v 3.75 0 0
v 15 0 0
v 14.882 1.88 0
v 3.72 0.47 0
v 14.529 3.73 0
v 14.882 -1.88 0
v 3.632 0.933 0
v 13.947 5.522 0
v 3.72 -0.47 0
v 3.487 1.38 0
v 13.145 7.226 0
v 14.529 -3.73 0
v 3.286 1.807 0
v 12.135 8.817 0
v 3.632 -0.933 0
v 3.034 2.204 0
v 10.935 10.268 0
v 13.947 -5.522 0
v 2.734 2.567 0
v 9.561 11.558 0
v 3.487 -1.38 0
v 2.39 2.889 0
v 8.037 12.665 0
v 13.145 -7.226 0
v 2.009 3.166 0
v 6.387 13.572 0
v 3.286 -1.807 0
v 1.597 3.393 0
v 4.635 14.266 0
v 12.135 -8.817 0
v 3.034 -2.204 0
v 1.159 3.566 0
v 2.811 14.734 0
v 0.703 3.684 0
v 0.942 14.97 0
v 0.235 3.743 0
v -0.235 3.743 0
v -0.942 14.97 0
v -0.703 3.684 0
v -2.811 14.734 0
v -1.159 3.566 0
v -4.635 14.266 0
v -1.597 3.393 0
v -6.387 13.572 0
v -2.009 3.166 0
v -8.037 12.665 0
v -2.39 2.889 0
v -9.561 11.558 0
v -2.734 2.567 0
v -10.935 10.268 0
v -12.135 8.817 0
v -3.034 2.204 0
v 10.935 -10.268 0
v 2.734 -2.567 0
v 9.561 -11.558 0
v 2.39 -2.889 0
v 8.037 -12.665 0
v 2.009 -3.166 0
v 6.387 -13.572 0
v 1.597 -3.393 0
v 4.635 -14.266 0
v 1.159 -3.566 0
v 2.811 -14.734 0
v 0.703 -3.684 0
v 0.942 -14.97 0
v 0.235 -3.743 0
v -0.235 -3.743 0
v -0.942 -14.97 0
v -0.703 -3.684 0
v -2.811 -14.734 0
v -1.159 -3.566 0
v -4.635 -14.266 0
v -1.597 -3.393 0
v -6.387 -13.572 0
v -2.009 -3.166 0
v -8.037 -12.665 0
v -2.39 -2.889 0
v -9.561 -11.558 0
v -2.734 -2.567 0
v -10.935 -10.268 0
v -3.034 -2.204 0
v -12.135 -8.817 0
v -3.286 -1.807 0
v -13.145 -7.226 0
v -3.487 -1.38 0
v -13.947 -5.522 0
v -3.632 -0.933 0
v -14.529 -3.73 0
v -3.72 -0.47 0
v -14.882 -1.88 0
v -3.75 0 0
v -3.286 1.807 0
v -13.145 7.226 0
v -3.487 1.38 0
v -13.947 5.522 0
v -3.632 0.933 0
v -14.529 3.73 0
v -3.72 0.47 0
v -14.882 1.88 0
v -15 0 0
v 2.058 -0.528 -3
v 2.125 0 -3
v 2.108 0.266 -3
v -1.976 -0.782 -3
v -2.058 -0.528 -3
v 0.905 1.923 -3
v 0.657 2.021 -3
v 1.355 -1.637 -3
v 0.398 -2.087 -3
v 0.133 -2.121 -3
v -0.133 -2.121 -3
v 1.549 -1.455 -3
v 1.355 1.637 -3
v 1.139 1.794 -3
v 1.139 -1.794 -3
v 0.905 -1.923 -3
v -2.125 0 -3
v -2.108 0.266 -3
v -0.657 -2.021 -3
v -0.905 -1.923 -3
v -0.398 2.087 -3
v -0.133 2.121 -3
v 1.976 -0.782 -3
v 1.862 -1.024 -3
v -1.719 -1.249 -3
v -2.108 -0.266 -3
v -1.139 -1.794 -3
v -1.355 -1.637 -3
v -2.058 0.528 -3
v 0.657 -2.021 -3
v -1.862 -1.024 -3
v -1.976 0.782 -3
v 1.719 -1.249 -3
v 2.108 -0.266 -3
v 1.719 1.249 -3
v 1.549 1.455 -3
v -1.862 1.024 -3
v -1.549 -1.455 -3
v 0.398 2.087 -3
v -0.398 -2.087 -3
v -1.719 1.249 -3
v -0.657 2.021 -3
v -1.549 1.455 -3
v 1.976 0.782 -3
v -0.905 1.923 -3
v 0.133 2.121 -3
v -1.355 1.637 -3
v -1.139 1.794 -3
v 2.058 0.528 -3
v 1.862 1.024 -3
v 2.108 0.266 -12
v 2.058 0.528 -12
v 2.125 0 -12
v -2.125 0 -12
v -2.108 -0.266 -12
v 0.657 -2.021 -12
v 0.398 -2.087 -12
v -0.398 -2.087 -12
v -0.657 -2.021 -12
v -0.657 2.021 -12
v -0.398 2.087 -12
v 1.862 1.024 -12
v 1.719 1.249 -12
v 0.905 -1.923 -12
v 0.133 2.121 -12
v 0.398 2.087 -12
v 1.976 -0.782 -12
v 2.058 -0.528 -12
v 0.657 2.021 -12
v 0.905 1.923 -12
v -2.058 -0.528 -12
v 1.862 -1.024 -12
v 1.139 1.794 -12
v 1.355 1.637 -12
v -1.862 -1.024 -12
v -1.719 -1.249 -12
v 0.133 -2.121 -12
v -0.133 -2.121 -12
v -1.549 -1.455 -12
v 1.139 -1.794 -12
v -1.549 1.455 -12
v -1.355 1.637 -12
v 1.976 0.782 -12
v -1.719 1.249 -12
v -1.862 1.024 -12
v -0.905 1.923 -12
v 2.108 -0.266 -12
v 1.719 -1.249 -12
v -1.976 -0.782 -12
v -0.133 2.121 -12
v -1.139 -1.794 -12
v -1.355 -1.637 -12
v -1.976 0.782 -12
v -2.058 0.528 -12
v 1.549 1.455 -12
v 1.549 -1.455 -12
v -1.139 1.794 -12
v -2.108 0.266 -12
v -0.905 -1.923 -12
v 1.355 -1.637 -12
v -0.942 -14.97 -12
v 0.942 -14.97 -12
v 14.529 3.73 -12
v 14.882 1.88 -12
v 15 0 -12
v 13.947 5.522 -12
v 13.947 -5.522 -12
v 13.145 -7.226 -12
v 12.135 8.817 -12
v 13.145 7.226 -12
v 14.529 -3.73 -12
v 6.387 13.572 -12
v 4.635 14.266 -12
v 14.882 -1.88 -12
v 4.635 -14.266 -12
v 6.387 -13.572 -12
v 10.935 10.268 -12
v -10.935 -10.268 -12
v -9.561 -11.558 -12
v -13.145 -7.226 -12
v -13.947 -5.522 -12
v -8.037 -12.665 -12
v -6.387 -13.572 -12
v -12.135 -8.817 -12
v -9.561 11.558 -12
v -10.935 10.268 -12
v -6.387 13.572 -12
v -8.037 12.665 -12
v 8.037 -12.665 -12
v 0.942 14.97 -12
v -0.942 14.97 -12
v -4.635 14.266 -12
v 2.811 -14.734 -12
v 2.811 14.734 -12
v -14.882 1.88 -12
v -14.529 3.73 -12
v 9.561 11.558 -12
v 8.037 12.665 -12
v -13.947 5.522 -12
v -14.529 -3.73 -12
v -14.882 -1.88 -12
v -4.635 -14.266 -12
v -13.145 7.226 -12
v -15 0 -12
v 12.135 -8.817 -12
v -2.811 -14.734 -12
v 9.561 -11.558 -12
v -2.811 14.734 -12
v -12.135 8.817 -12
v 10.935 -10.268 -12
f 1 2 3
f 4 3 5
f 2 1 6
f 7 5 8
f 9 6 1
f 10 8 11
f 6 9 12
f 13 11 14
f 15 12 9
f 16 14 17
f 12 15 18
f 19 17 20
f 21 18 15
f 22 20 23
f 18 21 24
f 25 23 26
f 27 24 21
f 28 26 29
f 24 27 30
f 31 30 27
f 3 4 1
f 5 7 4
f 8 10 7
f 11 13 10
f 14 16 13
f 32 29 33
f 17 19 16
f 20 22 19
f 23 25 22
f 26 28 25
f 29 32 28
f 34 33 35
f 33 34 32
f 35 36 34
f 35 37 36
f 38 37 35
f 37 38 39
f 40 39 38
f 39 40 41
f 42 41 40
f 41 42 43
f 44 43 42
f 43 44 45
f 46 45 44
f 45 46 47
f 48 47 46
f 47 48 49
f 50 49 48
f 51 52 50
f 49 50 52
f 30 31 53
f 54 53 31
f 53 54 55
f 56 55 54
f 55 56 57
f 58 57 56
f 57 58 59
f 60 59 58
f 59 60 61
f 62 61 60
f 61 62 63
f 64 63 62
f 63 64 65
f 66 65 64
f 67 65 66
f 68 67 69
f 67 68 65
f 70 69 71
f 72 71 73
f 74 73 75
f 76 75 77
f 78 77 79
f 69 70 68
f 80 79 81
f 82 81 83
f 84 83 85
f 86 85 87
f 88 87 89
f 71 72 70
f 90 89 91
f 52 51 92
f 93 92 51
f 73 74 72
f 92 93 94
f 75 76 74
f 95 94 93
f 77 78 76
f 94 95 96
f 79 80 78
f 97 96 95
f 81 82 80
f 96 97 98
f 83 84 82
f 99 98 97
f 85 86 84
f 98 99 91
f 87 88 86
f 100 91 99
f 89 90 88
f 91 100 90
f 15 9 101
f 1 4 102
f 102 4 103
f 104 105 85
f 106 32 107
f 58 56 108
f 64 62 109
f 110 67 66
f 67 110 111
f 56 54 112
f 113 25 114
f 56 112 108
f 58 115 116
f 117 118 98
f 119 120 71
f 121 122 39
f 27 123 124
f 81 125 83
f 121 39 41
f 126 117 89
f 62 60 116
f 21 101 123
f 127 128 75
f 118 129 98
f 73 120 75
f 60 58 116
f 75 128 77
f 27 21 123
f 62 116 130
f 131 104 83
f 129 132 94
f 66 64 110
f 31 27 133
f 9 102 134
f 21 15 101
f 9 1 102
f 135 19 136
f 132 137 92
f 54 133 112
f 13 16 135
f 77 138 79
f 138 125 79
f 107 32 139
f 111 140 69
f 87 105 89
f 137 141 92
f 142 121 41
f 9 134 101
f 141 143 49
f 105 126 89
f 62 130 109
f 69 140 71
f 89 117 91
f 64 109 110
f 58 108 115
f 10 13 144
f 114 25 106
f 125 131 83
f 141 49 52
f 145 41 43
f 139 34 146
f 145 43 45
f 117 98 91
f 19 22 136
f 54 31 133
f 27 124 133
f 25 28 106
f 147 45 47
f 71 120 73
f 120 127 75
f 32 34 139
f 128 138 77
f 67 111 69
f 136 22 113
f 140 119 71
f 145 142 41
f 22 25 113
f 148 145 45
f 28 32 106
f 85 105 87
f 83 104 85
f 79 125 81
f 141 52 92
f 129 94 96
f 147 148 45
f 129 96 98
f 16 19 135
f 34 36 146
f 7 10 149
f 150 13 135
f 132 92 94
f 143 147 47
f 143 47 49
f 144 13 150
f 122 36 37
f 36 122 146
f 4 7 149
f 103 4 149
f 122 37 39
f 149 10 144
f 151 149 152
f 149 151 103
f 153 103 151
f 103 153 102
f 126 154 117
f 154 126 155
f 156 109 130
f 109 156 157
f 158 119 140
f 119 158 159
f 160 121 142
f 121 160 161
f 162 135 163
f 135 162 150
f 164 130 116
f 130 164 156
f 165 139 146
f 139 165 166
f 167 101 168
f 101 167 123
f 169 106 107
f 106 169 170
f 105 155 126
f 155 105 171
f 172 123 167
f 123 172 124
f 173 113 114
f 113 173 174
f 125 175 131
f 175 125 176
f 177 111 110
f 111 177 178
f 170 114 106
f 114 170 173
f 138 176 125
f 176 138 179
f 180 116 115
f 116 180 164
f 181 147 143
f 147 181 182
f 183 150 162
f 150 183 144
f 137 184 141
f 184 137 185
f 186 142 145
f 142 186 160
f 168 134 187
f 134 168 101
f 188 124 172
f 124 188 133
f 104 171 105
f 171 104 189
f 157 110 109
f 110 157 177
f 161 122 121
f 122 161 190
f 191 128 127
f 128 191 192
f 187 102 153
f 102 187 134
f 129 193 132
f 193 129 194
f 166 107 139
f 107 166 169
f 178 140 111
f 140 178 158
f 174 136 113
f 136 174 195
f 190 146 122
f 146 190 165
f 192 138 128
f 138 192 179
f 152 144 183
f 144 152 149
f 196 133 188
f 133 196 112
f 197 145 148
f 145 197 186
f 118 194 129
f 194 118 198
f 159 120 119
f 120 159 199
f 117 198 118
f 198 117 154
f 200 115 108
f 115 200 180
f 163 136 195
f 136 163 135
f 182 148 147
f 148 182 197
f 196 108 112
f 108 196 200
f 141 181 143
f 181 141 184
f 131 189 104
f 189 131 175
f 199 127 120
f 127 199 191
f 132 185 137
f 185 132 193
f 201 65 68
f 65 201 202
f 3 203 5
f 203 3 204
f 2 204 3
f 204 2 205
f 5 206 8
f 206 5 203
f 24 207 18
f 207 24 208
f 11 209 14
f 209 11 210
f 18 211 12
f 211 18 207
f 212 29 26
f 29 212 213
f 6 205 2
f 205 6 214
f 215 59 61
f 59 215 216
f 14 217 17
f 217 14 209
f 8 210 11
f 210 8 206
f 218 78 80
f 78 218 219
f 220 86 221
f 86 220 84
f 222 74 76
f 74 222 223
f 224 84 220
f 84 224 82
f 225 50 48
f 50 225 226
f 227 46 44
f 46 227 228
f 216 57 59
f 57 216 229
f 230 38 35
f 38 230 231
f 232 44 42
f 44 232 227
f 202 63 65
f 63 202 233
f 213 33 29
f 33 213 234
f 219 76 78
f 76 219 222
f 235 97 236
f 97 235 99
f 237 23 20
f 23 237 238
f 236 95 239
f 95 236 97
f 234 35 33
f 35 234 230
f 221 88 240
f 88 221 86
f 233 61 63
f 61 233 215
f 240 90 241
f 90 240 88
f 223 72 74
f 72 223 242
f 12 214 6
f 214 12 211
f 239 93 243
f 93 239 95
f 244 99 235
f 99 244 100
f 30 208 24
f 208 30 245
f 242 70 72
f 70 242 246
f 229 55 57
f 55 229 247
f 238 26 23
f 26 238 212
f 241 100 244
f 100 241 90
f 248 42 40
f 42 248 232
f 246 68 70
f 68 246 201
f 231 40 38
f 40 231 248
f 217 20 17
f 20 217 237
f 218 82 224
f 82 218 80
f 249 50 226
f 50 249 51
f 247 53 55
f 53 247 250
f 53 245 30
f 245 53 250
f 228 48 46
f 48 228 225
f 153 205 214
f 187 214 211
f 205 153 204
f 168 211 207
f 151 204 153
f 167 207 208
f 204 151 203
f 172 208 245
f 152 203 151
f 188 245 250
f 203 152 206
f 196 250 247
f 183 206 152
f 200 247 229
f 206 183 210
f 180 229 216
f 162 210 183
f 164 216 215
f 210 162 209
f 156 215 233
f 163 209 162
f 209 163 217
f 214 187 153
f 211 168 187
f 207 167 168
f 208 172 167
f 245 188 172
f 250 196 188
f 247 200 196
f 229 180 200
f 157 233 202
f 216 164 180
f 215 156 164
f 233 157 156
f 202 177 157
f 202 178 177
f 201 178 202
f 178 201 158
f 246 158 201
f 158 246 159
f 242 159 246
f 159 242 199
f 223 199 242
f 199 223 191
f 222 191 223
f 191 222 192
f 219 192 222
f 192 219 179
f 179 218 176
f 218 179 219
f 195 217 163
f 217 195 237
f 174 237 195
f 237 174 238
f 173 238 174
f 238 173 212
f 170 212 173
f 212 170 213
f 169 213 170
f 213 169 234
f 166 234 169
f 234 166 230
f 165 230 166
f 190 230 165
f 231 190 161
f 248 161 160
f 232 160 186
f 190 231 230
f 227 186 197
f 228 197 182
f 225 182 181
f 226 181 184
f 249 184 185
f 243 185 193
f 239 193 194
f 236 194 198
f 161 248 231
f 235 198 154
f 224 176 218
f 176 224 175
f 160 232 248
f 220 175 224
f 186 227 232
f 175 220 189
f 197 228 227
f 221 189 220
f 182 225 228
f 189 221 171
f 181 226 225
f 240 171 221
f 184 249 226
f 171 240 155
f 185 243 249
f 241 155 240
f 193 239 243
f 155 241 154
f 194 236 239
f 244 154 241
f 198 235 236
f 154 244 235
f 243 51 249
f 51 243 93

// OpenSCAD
$fn = 50;


difference() {
	union() {
		translate(v = [0, 0, -12.0000000000]) {
			cylinder(h = 12, r = 15.0000000000);
		}
	}
	union() {
		translate(v = [0, 0, 0]) {
			rotate(a = [0, 0, 0]) {
				difference() {
					union() {
						translate(v = [0, 0, -15.0000000000]) {
							cylinder(h = 15, r = 2.0000000000);
						}
						translate(v = [0, 0, -3]) {
							cylinder(h = 3, r1 = 2.1250000000, r2 = 3.7500000000);
						}
						translate(v = [0, 0, -15.0000000000]) {
							cylinder(h = 15, r = 2.1250000000);
						}
						translate(v = [0, 0, -15.0000000000]) {
							cylinder(h = 15, r = 2.0000000000);
						}
					}
					union();
				}
			}
		}
	}
}
